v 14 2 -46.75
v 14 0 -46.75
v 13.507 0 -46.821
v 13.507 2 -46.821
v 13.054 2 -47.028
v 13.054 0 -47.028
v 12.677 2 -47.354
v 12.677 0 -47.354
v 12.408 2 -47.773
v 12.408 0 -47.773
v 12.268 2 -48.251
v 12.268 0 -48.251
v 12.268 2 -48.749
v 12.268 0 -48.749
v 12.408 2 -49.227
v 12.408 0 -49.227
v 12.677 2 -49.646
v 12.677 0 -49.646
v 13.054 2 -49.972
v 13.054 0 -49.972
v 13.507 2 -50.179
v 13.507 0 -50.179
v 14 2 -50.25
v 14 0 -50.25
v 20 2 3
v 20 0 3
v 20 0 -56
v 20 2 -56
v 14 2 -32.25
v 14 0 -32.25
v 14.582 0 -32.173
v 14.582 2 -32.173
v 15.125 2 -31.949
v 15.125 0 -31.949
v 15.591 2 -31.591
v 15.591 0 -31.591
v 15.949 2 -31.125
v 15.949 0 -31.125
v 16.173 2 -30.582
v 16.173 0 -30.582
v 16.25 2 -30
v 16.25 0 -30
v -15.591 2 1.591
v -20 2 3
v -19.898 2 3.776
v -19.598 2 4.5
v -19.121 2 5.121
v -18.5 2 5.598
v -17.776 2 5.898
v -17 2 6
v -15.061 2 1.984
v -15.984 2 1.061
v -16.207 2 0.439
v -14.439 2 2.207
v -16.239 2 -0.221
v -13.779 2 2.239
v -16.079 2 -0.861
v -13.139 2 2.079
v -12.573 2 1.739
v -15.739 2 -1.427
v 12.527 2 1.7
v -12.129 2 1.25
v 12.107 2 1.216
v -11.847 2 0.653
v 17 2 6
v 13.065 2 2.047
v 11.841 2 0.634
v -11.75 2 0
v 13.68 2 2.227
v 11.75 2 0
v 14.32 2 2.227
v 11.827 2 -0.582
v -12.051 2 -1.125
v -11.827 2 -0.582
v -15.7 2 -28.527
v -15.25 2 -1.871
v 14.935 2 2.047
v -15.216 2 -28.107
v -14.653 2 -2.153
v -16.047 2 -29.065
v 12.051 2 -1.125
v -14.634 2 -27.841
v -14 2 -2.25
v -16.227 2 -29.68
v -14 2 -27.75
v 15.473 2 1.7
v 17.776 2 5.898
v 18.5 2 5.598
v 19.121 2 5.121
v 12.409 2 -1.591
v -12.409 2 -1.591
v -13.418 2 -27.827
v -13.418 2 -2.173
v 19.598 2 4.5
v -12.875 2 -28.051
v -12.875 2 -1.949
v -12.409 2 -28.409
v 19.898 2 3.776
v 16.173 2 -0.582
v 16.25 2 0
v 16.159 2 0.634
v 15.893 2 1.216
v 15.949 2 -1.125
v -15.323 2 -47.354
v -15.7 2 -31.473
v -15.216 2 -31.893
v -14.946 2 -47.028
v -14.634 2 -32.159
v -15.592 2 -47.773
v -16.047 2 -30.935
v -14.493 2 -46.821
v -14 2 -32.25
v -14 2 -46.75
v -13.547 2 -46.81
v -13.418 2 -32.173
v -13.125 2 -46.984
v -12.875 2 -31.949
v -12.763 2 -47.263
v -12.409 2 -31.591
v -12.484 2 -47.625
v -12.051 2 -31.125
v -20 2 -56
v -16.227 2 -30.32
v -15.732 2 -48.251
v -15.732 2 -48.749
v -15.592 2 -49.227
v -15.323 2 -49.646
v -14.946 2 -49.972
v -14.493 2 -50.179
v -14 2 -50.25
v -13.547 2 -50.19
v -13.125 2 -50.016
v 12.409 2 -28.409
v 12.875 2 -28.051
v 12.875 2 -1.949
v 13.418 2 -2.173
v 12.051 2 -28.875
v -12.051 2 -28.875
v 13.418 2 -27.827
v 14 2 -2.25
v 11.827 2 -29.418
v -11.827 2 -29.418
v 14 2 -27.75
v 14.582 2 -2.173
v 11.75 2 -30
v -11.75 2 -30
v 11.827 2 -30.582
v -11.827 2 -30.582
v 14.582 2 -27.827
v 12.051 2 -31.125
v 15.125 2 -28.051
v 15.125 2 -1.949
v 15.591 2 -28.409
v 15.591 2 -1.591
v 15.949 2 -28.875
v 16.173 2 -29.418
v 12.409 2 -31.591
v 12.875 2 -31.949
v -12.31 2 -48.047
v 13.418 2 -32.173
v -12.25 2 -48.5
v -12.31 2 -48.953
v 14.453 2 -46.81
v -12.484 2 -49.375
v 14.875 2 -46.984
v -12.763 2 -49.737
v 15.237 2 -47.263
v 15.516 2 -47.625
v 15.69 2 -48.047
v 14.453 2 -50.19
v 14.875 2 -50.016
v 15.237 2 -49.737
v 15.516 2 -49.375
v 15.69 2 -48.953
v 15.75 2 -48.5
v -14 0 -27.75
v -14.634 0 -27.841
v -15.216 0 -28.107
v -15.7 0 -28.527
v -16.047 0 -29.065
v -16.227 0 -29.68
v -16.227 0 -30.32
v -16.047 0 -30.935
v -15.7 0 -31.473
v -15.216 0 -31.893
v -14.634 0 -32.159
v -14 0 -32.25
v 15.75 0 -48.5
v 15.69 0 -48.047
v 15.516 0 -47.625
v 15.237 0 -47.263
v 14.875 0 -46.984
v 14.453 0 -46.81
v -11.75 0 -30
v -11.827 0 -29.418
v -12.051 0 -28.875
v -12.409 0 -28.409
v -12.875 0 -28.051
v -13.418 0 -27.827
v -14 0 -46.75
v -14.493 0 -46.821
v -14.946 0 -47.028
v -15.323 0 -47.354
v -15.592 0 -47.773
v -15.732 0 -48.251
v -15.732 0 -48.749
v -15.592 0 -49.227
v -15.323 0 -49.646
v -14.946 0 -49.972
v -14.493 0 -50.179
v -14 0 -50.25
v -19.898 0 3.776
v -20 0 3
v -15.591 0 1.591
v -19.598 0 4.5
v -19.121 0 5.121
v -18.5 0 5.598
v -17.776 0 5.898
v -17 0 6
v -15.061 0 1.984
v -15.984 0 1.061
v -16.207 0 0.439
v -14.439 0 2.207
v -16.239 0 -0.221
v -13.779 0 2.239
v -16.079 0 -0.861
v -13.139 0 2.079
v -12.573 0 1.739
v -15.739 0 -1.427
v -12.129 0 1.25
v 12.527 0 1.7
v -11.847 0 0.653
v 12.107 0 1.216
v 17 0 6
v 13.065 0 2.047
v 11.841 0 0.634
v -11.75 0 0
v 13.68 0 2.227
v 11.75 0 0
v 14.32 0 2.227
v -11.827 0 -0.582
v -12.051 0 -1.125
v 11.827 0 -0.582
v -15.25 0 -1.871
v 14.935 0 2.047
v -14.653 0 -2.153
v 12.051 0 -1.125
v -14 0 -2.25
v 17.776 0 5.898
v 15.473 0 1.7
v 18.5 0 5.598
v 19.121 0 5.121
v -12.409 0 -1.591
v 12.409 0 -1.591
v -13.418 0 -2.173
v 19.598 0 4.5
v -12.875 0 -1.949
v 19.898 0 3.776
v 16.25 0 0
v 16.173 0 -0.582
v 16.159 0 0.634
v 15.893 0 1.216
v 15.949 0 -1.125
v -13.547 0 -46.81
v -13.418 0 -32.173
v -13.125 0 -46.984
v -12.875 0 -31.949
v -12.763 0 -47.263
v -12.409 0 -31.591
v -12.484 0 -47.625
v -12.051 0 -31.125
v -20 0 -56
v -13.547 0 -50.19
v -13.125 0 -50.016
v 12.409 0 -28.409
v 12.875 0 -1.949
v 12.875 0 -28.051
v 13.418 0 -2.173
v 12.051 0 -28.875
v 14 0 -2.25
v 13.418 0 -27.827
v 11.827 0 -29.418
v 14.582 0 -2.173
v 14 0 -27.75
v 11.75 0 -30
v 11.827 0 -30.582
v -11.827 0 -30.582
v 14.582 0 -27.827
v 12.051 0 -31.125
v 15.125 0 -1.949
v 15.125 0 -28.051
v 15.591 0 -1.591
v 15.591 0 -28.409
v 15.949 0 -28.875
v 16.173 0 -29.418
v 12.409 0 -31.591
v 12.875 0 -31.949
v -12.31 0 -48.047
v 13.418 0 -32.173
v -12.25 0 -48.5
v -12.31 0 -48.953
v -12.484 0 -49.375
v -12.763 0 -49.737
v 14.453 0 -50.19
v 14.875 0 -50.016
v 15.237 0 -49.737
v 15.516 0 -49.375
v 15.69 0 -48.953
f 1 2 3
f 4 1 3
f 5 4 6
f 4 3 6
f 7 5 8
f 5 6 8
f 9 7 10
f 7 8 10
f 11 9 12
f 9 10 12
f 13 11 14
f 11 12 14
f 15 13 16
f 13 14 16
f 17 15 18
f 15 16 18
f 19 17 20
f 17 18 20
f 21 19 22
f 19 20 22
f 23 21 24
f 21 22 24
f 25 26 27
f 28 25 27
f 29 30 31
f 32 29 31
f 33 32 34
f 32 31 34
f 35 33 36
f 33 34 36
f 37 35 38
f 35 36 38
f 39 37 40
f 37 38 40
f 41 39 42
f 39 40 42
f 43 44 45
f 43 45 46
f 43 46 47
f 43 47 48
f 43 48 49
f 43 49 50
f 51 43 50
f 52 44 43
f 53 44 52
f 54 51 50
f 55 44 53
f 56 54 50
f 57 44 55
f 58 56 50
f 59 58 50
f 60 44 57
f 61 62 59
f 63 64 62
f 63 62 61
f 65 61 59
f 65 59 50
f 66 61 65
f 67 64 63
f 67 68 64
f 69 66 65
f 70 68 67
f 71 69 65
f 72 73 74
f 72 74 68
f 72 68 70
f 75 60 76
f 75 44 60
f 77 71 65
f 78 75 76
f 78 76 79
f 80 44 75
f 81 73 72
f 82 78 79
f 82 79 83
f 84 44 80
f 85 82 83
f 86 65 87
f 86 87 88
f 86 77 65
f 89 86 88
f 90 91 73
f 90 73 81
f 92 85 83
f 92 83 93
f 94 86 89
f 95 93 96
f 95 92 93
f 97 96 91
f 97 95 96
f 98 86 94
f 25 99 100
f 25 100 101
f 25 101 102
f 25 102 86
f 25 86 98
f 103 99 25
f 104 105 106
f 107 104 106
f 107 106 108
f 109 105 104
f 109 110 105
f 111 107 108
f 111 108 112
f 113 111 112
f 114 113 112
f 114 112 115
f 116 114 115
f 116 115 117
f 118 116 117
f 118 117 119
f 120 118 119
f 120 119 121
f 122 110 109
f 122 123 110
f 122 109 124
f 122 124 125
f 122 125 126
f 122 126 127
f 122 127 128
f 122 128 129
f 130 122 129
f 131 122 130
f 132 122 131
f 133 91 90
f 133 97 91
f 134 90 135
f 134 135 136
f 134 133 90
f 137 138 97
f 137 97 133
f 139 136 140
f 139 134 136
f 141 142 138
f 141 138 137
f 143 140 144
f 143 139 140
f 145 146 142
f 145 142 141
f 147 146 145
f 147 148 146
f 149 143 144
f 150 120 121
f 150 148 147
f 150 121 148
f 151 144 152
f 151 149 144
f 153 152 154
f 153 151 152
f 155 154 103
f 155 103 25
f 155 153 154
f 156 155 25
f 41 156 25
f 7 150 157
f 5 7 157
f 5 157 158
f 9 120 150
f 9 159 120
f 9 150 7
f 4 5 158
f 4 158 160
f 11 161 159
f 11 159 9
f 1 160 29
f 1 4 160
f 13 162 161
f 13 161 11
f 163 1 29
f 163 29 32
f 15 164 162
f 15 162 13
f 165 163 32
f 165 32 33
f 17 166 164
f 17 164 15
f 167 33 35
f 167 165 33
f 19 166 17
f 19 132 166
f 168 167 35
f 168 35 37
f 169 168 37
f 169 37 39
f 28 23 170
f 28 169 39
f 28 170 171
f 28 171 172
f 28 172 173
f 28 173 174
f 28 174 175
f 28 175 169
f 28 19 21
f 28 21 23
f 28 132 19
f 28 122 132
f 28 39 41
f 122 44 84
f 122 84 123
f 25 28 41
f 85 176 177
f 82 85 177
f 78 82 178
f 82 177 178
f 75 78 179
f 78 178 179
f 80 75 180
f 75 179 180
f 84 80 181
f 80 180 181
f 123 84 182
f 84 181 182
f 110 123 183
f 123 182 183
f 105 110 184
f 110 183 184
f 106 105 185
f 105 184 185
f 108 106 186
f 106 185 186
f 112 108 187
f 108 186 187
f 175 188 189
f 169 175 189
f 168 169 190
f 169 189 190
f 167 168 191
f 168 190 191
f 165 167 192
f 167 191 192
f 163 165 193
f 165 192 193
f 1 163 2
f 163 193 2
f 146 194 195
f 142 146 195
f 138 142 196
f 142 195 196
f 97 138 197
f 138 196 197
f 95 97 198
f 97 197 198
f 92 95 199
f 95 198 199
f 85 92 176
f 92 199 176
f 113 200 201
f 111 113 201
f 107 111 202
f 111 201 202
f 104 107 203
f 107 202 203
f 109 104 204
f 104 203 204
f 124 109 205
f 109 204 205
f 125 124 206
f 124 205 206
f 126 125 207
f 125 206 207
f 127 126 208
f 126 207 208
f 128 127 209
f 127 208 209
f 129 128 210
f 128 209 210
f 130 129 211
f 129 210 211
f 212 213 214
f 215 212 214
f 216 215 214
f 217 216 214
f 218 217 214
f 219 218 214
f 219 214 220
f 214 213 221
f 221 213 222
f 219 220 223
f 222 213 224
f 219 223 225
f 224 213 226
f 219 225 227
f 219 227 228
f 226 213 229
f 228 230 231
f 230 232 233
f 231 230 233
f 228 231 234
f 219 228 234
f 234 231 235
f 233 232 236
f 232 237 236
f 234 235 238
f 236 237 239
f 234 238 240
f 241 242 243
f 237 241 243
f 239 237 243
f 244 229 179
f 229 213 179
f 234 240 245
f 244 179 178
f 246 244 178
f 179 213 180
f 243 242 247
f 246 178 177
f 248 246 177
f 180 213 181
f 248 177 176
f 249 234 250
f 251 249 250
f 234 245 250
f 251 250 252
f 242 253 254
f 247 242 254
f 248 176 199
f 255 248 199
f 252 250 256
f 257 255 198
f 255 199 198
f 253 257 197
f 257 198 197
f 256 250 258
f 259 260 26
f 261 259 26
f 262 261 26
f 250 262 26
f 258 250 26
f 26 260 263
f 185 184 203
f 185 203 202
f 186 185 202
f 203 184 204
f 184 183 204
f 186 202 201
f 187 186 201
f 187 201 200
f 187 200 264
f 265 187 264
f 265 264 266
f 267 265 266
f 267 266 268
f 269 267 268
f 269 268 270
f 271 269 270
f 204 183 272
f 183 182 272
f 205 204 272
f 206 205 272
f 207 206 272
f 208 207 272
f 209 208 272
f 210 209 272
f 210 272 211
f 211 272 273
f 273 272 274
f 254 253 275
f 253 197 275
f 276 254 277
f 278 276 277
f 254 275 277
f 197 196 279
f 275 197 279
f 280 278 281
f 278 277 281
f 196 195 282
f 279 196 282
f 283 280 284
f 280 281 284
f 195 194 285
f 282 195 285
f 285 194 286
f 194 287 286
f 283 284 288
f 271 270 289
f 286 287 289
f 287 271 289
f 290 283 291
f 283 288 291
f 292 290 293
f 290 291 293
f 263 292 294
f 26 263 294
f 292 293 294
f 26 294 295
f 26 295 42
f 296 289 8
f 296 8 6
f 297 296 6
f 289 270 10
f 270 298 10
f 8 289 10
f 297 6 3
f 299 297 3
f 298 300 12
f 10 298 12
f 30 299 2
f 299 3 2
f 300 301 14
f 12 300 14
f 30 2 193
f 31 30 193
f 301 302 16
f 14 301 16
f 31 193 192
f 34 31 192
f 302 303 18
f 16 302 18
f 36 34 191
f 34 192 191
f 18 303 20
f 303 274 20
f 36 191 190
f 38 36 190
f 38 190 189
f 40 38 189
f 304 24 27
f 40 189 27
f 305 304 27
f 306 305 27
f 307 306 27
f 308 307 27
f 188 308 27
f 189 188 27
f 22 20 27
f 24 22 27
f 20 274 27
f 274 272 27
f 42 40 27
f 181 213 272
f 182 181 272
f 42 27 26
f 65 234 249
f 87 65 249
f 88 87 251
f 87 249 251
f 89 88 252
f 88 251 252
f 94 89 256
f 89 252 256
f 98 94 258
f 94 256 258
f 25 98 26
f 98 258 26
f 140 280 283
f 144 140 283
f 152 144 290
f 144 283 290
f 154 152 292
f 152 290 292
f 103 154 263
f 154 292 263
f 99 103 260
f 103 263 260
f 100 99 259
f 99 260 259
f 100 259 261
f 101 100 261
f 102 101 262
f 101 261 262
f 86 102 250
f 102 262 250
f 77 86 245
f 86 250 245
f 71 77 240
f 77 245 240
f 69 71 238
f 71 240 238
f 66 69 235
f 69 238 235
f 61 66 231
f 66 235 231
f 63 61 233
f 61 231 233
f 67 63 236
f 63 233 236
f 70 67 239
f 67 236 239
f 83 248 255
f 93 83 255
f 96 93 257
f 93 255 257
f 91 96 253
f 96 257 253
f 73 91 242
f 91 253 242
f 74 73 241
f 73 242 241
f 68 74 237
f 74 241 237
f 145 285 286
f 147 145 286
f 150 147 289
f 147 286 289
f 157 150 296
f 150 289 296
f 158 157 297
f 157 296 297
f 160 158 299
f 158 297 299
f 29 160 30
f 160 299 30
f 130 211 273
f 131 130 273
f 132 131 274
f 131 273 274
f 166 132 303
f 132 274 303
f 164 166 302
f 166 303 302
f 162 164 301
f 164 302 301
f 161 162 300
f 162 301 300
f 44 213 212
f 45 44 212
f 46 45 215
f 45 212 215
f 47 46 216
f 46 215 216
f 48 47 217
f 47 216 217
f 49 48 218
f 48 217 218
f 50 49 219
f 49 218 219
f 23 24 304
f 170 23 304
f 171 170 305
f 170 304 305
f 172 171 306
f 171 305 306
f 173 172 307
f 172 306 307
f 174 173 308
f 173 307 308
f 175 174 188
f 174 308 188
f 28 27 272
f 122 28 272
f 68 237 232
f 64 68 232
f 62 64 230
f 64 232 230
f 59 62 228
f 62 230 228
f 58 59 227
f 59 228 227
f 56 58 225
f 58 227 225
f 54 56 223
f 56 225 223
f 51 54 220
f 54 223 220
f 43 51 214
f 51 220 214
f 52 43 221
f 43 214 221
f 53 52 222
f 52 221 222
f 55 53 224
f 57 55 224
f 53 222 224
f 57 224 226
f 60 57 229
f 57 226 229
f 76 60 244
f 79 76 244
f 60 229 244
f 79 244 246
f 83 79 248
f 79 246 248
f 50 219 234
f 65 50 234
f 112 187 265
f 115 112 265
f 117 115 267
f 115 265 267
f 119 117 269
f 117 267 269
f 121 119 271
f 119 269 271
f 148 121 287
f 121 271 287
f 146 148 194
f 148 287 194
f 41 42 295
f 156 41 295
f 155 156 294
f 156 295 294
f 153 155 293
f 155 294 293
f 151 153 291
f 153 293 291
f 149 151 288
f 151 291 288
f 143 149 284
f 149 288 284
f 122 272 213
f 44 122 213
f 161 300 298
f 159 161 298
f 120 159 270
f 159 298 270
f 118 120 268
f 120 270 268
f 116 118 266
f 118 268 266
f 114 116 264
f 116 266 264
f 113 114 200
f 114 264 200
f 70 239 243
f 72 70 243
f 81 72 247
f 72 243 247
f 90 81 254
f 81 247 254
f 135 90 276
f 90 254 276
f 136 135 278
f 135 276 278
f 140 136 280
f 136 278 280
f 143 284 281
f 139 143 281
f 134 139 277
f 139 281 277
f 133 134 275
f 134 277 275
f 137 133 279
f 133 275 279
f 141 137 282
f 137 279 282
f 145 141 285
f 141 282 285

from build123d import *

# Parameters (mm, degrees)
EXTRUDE_1_DEPTH = 2


with BuildPart() as part:
    # 草图1 → 凸台-拉伸1 (new body)
    with BuildSketch(Plane(origin=(0, 0, 0), x_dir=(1, 0, 0), z_dir=(0, 1, 0))):
        with BuildLine():
            Line((-11.75, 0), (0, 0))
            Line((0, 0), (0, 30))
            Line((0, 30), (-11.75, 30))
            ThreePointArc((-11.75, 30), (-12.409009742, 28.409009742), (-14, 27.75))
            Line((-14, 27.75), (-14, 2.25))
            ThreePointArc((-14, 2.25), (-12.409009742, 1.590990258), (-11.75, 0))
        make_face()
        with BuildLine():
            Line((0, 30), (0, 0))
            Line((0, 0), (11.75, 0))
            ThreePointArc((11.75, 0), (12.409009742, 1.590990258), (14, 2.25))
            Line((14, 2.25), (14, 27.75))
            ThreePointArc((14, 27.75), (12.409009742, 28.409009742), (11.75, 30))
            Line((11.75, 30), (0, 30))
        make_face()
        with BuildLine():
            Line((11.75, 0), (0, 0))
            Line((0, 0), (-11.75, 0))
            ThreePointArc((-11.75, 0), (-15.590990258, -1.590990258), (-14, 2.25))
            Line((-14, 2.25), (-14, 27.75))
            ThreePointArc((-14, 27.75), (-16.25, 30), (-14, 32.25))
            Line((-14, 32.25), (-14, 46.75))
            ThreePointArc((-14, 46.75), (-15.75, 48.5), (-14, 50.25))
            Line((-14, 50.25), (-14, 56))
            Line((-14, 56), (-20, 56))
            Line((-20, 56), (-20, -3))
            ThreePointArc((-20, -3), (-19.121320344, -5.121320344), (-17, -6))
            Line((-17, -6), (17, -6))
            ThreePointArc((17, -6), (19.121320344, -5.121320344), (20, -3))
            Line((20, -3), (20, 56))
            Line((20, 56), (14, 56))
            Line((14, 56), (14, 50.25))
            ThreePointArc((14, 50.25), (15.237436867, 49.737436867), (15.75, 48.5))
            ThreePointArc((15.75, 48.5), (15.237436867, 47.262563133), (14, 46.75))
            Line((14, 46.75), (14, 32.25))
            ThreePointArc((14, 32.25), (15.590990258, 31.590990258), (16.25, 30))
            ThreePointArc((16.25, 30), (15.590990258, 28.409009742), (14, 27.75))
            Line((14, 27.75), (14, 2.25))
            ThreePointArc((14, 2.25), (15.590990258, 1.590990258), (16.25, 0))
            ThreePointArc((16.25, 0), (14, -2.25), (11.75, 0))
        make_face()
        with BuildLine():
            Line((-11.75, 30), (0, 30))
            Line((0, 30), (11.75, 30))
            ThreePointArc((11.75, 30), (12.409009742, 31.590990258), (14, 32.25))
            Line((14, 32.25), (14, 46.75))
            ThreePointArc((14, 46.75), (12.25, 48.5), (14, 50.25))
            Line((14, 50.25), (14, 56))
            Line((14, 56), (-14, 56))
            Line((-14, 56), (-14, 50.25))
            ThreePointArc((-14, 50.25), (-12.762563133, 49.737436867), (-12.25, 48.5))
            ThreePointArc((-12.25, 48.5), (-12.762563133, 47.262563133), (-14, 46.75))
            Line((-14, 46.75), (-14, 32.25))
            ThreePointArc((-14, 32.25), (-12.409009742, 31.590990258), (-11.75, 30))
        make_face()
    extrude(amount=EXTRUDE_1_DEPTH)


solid = part.part
